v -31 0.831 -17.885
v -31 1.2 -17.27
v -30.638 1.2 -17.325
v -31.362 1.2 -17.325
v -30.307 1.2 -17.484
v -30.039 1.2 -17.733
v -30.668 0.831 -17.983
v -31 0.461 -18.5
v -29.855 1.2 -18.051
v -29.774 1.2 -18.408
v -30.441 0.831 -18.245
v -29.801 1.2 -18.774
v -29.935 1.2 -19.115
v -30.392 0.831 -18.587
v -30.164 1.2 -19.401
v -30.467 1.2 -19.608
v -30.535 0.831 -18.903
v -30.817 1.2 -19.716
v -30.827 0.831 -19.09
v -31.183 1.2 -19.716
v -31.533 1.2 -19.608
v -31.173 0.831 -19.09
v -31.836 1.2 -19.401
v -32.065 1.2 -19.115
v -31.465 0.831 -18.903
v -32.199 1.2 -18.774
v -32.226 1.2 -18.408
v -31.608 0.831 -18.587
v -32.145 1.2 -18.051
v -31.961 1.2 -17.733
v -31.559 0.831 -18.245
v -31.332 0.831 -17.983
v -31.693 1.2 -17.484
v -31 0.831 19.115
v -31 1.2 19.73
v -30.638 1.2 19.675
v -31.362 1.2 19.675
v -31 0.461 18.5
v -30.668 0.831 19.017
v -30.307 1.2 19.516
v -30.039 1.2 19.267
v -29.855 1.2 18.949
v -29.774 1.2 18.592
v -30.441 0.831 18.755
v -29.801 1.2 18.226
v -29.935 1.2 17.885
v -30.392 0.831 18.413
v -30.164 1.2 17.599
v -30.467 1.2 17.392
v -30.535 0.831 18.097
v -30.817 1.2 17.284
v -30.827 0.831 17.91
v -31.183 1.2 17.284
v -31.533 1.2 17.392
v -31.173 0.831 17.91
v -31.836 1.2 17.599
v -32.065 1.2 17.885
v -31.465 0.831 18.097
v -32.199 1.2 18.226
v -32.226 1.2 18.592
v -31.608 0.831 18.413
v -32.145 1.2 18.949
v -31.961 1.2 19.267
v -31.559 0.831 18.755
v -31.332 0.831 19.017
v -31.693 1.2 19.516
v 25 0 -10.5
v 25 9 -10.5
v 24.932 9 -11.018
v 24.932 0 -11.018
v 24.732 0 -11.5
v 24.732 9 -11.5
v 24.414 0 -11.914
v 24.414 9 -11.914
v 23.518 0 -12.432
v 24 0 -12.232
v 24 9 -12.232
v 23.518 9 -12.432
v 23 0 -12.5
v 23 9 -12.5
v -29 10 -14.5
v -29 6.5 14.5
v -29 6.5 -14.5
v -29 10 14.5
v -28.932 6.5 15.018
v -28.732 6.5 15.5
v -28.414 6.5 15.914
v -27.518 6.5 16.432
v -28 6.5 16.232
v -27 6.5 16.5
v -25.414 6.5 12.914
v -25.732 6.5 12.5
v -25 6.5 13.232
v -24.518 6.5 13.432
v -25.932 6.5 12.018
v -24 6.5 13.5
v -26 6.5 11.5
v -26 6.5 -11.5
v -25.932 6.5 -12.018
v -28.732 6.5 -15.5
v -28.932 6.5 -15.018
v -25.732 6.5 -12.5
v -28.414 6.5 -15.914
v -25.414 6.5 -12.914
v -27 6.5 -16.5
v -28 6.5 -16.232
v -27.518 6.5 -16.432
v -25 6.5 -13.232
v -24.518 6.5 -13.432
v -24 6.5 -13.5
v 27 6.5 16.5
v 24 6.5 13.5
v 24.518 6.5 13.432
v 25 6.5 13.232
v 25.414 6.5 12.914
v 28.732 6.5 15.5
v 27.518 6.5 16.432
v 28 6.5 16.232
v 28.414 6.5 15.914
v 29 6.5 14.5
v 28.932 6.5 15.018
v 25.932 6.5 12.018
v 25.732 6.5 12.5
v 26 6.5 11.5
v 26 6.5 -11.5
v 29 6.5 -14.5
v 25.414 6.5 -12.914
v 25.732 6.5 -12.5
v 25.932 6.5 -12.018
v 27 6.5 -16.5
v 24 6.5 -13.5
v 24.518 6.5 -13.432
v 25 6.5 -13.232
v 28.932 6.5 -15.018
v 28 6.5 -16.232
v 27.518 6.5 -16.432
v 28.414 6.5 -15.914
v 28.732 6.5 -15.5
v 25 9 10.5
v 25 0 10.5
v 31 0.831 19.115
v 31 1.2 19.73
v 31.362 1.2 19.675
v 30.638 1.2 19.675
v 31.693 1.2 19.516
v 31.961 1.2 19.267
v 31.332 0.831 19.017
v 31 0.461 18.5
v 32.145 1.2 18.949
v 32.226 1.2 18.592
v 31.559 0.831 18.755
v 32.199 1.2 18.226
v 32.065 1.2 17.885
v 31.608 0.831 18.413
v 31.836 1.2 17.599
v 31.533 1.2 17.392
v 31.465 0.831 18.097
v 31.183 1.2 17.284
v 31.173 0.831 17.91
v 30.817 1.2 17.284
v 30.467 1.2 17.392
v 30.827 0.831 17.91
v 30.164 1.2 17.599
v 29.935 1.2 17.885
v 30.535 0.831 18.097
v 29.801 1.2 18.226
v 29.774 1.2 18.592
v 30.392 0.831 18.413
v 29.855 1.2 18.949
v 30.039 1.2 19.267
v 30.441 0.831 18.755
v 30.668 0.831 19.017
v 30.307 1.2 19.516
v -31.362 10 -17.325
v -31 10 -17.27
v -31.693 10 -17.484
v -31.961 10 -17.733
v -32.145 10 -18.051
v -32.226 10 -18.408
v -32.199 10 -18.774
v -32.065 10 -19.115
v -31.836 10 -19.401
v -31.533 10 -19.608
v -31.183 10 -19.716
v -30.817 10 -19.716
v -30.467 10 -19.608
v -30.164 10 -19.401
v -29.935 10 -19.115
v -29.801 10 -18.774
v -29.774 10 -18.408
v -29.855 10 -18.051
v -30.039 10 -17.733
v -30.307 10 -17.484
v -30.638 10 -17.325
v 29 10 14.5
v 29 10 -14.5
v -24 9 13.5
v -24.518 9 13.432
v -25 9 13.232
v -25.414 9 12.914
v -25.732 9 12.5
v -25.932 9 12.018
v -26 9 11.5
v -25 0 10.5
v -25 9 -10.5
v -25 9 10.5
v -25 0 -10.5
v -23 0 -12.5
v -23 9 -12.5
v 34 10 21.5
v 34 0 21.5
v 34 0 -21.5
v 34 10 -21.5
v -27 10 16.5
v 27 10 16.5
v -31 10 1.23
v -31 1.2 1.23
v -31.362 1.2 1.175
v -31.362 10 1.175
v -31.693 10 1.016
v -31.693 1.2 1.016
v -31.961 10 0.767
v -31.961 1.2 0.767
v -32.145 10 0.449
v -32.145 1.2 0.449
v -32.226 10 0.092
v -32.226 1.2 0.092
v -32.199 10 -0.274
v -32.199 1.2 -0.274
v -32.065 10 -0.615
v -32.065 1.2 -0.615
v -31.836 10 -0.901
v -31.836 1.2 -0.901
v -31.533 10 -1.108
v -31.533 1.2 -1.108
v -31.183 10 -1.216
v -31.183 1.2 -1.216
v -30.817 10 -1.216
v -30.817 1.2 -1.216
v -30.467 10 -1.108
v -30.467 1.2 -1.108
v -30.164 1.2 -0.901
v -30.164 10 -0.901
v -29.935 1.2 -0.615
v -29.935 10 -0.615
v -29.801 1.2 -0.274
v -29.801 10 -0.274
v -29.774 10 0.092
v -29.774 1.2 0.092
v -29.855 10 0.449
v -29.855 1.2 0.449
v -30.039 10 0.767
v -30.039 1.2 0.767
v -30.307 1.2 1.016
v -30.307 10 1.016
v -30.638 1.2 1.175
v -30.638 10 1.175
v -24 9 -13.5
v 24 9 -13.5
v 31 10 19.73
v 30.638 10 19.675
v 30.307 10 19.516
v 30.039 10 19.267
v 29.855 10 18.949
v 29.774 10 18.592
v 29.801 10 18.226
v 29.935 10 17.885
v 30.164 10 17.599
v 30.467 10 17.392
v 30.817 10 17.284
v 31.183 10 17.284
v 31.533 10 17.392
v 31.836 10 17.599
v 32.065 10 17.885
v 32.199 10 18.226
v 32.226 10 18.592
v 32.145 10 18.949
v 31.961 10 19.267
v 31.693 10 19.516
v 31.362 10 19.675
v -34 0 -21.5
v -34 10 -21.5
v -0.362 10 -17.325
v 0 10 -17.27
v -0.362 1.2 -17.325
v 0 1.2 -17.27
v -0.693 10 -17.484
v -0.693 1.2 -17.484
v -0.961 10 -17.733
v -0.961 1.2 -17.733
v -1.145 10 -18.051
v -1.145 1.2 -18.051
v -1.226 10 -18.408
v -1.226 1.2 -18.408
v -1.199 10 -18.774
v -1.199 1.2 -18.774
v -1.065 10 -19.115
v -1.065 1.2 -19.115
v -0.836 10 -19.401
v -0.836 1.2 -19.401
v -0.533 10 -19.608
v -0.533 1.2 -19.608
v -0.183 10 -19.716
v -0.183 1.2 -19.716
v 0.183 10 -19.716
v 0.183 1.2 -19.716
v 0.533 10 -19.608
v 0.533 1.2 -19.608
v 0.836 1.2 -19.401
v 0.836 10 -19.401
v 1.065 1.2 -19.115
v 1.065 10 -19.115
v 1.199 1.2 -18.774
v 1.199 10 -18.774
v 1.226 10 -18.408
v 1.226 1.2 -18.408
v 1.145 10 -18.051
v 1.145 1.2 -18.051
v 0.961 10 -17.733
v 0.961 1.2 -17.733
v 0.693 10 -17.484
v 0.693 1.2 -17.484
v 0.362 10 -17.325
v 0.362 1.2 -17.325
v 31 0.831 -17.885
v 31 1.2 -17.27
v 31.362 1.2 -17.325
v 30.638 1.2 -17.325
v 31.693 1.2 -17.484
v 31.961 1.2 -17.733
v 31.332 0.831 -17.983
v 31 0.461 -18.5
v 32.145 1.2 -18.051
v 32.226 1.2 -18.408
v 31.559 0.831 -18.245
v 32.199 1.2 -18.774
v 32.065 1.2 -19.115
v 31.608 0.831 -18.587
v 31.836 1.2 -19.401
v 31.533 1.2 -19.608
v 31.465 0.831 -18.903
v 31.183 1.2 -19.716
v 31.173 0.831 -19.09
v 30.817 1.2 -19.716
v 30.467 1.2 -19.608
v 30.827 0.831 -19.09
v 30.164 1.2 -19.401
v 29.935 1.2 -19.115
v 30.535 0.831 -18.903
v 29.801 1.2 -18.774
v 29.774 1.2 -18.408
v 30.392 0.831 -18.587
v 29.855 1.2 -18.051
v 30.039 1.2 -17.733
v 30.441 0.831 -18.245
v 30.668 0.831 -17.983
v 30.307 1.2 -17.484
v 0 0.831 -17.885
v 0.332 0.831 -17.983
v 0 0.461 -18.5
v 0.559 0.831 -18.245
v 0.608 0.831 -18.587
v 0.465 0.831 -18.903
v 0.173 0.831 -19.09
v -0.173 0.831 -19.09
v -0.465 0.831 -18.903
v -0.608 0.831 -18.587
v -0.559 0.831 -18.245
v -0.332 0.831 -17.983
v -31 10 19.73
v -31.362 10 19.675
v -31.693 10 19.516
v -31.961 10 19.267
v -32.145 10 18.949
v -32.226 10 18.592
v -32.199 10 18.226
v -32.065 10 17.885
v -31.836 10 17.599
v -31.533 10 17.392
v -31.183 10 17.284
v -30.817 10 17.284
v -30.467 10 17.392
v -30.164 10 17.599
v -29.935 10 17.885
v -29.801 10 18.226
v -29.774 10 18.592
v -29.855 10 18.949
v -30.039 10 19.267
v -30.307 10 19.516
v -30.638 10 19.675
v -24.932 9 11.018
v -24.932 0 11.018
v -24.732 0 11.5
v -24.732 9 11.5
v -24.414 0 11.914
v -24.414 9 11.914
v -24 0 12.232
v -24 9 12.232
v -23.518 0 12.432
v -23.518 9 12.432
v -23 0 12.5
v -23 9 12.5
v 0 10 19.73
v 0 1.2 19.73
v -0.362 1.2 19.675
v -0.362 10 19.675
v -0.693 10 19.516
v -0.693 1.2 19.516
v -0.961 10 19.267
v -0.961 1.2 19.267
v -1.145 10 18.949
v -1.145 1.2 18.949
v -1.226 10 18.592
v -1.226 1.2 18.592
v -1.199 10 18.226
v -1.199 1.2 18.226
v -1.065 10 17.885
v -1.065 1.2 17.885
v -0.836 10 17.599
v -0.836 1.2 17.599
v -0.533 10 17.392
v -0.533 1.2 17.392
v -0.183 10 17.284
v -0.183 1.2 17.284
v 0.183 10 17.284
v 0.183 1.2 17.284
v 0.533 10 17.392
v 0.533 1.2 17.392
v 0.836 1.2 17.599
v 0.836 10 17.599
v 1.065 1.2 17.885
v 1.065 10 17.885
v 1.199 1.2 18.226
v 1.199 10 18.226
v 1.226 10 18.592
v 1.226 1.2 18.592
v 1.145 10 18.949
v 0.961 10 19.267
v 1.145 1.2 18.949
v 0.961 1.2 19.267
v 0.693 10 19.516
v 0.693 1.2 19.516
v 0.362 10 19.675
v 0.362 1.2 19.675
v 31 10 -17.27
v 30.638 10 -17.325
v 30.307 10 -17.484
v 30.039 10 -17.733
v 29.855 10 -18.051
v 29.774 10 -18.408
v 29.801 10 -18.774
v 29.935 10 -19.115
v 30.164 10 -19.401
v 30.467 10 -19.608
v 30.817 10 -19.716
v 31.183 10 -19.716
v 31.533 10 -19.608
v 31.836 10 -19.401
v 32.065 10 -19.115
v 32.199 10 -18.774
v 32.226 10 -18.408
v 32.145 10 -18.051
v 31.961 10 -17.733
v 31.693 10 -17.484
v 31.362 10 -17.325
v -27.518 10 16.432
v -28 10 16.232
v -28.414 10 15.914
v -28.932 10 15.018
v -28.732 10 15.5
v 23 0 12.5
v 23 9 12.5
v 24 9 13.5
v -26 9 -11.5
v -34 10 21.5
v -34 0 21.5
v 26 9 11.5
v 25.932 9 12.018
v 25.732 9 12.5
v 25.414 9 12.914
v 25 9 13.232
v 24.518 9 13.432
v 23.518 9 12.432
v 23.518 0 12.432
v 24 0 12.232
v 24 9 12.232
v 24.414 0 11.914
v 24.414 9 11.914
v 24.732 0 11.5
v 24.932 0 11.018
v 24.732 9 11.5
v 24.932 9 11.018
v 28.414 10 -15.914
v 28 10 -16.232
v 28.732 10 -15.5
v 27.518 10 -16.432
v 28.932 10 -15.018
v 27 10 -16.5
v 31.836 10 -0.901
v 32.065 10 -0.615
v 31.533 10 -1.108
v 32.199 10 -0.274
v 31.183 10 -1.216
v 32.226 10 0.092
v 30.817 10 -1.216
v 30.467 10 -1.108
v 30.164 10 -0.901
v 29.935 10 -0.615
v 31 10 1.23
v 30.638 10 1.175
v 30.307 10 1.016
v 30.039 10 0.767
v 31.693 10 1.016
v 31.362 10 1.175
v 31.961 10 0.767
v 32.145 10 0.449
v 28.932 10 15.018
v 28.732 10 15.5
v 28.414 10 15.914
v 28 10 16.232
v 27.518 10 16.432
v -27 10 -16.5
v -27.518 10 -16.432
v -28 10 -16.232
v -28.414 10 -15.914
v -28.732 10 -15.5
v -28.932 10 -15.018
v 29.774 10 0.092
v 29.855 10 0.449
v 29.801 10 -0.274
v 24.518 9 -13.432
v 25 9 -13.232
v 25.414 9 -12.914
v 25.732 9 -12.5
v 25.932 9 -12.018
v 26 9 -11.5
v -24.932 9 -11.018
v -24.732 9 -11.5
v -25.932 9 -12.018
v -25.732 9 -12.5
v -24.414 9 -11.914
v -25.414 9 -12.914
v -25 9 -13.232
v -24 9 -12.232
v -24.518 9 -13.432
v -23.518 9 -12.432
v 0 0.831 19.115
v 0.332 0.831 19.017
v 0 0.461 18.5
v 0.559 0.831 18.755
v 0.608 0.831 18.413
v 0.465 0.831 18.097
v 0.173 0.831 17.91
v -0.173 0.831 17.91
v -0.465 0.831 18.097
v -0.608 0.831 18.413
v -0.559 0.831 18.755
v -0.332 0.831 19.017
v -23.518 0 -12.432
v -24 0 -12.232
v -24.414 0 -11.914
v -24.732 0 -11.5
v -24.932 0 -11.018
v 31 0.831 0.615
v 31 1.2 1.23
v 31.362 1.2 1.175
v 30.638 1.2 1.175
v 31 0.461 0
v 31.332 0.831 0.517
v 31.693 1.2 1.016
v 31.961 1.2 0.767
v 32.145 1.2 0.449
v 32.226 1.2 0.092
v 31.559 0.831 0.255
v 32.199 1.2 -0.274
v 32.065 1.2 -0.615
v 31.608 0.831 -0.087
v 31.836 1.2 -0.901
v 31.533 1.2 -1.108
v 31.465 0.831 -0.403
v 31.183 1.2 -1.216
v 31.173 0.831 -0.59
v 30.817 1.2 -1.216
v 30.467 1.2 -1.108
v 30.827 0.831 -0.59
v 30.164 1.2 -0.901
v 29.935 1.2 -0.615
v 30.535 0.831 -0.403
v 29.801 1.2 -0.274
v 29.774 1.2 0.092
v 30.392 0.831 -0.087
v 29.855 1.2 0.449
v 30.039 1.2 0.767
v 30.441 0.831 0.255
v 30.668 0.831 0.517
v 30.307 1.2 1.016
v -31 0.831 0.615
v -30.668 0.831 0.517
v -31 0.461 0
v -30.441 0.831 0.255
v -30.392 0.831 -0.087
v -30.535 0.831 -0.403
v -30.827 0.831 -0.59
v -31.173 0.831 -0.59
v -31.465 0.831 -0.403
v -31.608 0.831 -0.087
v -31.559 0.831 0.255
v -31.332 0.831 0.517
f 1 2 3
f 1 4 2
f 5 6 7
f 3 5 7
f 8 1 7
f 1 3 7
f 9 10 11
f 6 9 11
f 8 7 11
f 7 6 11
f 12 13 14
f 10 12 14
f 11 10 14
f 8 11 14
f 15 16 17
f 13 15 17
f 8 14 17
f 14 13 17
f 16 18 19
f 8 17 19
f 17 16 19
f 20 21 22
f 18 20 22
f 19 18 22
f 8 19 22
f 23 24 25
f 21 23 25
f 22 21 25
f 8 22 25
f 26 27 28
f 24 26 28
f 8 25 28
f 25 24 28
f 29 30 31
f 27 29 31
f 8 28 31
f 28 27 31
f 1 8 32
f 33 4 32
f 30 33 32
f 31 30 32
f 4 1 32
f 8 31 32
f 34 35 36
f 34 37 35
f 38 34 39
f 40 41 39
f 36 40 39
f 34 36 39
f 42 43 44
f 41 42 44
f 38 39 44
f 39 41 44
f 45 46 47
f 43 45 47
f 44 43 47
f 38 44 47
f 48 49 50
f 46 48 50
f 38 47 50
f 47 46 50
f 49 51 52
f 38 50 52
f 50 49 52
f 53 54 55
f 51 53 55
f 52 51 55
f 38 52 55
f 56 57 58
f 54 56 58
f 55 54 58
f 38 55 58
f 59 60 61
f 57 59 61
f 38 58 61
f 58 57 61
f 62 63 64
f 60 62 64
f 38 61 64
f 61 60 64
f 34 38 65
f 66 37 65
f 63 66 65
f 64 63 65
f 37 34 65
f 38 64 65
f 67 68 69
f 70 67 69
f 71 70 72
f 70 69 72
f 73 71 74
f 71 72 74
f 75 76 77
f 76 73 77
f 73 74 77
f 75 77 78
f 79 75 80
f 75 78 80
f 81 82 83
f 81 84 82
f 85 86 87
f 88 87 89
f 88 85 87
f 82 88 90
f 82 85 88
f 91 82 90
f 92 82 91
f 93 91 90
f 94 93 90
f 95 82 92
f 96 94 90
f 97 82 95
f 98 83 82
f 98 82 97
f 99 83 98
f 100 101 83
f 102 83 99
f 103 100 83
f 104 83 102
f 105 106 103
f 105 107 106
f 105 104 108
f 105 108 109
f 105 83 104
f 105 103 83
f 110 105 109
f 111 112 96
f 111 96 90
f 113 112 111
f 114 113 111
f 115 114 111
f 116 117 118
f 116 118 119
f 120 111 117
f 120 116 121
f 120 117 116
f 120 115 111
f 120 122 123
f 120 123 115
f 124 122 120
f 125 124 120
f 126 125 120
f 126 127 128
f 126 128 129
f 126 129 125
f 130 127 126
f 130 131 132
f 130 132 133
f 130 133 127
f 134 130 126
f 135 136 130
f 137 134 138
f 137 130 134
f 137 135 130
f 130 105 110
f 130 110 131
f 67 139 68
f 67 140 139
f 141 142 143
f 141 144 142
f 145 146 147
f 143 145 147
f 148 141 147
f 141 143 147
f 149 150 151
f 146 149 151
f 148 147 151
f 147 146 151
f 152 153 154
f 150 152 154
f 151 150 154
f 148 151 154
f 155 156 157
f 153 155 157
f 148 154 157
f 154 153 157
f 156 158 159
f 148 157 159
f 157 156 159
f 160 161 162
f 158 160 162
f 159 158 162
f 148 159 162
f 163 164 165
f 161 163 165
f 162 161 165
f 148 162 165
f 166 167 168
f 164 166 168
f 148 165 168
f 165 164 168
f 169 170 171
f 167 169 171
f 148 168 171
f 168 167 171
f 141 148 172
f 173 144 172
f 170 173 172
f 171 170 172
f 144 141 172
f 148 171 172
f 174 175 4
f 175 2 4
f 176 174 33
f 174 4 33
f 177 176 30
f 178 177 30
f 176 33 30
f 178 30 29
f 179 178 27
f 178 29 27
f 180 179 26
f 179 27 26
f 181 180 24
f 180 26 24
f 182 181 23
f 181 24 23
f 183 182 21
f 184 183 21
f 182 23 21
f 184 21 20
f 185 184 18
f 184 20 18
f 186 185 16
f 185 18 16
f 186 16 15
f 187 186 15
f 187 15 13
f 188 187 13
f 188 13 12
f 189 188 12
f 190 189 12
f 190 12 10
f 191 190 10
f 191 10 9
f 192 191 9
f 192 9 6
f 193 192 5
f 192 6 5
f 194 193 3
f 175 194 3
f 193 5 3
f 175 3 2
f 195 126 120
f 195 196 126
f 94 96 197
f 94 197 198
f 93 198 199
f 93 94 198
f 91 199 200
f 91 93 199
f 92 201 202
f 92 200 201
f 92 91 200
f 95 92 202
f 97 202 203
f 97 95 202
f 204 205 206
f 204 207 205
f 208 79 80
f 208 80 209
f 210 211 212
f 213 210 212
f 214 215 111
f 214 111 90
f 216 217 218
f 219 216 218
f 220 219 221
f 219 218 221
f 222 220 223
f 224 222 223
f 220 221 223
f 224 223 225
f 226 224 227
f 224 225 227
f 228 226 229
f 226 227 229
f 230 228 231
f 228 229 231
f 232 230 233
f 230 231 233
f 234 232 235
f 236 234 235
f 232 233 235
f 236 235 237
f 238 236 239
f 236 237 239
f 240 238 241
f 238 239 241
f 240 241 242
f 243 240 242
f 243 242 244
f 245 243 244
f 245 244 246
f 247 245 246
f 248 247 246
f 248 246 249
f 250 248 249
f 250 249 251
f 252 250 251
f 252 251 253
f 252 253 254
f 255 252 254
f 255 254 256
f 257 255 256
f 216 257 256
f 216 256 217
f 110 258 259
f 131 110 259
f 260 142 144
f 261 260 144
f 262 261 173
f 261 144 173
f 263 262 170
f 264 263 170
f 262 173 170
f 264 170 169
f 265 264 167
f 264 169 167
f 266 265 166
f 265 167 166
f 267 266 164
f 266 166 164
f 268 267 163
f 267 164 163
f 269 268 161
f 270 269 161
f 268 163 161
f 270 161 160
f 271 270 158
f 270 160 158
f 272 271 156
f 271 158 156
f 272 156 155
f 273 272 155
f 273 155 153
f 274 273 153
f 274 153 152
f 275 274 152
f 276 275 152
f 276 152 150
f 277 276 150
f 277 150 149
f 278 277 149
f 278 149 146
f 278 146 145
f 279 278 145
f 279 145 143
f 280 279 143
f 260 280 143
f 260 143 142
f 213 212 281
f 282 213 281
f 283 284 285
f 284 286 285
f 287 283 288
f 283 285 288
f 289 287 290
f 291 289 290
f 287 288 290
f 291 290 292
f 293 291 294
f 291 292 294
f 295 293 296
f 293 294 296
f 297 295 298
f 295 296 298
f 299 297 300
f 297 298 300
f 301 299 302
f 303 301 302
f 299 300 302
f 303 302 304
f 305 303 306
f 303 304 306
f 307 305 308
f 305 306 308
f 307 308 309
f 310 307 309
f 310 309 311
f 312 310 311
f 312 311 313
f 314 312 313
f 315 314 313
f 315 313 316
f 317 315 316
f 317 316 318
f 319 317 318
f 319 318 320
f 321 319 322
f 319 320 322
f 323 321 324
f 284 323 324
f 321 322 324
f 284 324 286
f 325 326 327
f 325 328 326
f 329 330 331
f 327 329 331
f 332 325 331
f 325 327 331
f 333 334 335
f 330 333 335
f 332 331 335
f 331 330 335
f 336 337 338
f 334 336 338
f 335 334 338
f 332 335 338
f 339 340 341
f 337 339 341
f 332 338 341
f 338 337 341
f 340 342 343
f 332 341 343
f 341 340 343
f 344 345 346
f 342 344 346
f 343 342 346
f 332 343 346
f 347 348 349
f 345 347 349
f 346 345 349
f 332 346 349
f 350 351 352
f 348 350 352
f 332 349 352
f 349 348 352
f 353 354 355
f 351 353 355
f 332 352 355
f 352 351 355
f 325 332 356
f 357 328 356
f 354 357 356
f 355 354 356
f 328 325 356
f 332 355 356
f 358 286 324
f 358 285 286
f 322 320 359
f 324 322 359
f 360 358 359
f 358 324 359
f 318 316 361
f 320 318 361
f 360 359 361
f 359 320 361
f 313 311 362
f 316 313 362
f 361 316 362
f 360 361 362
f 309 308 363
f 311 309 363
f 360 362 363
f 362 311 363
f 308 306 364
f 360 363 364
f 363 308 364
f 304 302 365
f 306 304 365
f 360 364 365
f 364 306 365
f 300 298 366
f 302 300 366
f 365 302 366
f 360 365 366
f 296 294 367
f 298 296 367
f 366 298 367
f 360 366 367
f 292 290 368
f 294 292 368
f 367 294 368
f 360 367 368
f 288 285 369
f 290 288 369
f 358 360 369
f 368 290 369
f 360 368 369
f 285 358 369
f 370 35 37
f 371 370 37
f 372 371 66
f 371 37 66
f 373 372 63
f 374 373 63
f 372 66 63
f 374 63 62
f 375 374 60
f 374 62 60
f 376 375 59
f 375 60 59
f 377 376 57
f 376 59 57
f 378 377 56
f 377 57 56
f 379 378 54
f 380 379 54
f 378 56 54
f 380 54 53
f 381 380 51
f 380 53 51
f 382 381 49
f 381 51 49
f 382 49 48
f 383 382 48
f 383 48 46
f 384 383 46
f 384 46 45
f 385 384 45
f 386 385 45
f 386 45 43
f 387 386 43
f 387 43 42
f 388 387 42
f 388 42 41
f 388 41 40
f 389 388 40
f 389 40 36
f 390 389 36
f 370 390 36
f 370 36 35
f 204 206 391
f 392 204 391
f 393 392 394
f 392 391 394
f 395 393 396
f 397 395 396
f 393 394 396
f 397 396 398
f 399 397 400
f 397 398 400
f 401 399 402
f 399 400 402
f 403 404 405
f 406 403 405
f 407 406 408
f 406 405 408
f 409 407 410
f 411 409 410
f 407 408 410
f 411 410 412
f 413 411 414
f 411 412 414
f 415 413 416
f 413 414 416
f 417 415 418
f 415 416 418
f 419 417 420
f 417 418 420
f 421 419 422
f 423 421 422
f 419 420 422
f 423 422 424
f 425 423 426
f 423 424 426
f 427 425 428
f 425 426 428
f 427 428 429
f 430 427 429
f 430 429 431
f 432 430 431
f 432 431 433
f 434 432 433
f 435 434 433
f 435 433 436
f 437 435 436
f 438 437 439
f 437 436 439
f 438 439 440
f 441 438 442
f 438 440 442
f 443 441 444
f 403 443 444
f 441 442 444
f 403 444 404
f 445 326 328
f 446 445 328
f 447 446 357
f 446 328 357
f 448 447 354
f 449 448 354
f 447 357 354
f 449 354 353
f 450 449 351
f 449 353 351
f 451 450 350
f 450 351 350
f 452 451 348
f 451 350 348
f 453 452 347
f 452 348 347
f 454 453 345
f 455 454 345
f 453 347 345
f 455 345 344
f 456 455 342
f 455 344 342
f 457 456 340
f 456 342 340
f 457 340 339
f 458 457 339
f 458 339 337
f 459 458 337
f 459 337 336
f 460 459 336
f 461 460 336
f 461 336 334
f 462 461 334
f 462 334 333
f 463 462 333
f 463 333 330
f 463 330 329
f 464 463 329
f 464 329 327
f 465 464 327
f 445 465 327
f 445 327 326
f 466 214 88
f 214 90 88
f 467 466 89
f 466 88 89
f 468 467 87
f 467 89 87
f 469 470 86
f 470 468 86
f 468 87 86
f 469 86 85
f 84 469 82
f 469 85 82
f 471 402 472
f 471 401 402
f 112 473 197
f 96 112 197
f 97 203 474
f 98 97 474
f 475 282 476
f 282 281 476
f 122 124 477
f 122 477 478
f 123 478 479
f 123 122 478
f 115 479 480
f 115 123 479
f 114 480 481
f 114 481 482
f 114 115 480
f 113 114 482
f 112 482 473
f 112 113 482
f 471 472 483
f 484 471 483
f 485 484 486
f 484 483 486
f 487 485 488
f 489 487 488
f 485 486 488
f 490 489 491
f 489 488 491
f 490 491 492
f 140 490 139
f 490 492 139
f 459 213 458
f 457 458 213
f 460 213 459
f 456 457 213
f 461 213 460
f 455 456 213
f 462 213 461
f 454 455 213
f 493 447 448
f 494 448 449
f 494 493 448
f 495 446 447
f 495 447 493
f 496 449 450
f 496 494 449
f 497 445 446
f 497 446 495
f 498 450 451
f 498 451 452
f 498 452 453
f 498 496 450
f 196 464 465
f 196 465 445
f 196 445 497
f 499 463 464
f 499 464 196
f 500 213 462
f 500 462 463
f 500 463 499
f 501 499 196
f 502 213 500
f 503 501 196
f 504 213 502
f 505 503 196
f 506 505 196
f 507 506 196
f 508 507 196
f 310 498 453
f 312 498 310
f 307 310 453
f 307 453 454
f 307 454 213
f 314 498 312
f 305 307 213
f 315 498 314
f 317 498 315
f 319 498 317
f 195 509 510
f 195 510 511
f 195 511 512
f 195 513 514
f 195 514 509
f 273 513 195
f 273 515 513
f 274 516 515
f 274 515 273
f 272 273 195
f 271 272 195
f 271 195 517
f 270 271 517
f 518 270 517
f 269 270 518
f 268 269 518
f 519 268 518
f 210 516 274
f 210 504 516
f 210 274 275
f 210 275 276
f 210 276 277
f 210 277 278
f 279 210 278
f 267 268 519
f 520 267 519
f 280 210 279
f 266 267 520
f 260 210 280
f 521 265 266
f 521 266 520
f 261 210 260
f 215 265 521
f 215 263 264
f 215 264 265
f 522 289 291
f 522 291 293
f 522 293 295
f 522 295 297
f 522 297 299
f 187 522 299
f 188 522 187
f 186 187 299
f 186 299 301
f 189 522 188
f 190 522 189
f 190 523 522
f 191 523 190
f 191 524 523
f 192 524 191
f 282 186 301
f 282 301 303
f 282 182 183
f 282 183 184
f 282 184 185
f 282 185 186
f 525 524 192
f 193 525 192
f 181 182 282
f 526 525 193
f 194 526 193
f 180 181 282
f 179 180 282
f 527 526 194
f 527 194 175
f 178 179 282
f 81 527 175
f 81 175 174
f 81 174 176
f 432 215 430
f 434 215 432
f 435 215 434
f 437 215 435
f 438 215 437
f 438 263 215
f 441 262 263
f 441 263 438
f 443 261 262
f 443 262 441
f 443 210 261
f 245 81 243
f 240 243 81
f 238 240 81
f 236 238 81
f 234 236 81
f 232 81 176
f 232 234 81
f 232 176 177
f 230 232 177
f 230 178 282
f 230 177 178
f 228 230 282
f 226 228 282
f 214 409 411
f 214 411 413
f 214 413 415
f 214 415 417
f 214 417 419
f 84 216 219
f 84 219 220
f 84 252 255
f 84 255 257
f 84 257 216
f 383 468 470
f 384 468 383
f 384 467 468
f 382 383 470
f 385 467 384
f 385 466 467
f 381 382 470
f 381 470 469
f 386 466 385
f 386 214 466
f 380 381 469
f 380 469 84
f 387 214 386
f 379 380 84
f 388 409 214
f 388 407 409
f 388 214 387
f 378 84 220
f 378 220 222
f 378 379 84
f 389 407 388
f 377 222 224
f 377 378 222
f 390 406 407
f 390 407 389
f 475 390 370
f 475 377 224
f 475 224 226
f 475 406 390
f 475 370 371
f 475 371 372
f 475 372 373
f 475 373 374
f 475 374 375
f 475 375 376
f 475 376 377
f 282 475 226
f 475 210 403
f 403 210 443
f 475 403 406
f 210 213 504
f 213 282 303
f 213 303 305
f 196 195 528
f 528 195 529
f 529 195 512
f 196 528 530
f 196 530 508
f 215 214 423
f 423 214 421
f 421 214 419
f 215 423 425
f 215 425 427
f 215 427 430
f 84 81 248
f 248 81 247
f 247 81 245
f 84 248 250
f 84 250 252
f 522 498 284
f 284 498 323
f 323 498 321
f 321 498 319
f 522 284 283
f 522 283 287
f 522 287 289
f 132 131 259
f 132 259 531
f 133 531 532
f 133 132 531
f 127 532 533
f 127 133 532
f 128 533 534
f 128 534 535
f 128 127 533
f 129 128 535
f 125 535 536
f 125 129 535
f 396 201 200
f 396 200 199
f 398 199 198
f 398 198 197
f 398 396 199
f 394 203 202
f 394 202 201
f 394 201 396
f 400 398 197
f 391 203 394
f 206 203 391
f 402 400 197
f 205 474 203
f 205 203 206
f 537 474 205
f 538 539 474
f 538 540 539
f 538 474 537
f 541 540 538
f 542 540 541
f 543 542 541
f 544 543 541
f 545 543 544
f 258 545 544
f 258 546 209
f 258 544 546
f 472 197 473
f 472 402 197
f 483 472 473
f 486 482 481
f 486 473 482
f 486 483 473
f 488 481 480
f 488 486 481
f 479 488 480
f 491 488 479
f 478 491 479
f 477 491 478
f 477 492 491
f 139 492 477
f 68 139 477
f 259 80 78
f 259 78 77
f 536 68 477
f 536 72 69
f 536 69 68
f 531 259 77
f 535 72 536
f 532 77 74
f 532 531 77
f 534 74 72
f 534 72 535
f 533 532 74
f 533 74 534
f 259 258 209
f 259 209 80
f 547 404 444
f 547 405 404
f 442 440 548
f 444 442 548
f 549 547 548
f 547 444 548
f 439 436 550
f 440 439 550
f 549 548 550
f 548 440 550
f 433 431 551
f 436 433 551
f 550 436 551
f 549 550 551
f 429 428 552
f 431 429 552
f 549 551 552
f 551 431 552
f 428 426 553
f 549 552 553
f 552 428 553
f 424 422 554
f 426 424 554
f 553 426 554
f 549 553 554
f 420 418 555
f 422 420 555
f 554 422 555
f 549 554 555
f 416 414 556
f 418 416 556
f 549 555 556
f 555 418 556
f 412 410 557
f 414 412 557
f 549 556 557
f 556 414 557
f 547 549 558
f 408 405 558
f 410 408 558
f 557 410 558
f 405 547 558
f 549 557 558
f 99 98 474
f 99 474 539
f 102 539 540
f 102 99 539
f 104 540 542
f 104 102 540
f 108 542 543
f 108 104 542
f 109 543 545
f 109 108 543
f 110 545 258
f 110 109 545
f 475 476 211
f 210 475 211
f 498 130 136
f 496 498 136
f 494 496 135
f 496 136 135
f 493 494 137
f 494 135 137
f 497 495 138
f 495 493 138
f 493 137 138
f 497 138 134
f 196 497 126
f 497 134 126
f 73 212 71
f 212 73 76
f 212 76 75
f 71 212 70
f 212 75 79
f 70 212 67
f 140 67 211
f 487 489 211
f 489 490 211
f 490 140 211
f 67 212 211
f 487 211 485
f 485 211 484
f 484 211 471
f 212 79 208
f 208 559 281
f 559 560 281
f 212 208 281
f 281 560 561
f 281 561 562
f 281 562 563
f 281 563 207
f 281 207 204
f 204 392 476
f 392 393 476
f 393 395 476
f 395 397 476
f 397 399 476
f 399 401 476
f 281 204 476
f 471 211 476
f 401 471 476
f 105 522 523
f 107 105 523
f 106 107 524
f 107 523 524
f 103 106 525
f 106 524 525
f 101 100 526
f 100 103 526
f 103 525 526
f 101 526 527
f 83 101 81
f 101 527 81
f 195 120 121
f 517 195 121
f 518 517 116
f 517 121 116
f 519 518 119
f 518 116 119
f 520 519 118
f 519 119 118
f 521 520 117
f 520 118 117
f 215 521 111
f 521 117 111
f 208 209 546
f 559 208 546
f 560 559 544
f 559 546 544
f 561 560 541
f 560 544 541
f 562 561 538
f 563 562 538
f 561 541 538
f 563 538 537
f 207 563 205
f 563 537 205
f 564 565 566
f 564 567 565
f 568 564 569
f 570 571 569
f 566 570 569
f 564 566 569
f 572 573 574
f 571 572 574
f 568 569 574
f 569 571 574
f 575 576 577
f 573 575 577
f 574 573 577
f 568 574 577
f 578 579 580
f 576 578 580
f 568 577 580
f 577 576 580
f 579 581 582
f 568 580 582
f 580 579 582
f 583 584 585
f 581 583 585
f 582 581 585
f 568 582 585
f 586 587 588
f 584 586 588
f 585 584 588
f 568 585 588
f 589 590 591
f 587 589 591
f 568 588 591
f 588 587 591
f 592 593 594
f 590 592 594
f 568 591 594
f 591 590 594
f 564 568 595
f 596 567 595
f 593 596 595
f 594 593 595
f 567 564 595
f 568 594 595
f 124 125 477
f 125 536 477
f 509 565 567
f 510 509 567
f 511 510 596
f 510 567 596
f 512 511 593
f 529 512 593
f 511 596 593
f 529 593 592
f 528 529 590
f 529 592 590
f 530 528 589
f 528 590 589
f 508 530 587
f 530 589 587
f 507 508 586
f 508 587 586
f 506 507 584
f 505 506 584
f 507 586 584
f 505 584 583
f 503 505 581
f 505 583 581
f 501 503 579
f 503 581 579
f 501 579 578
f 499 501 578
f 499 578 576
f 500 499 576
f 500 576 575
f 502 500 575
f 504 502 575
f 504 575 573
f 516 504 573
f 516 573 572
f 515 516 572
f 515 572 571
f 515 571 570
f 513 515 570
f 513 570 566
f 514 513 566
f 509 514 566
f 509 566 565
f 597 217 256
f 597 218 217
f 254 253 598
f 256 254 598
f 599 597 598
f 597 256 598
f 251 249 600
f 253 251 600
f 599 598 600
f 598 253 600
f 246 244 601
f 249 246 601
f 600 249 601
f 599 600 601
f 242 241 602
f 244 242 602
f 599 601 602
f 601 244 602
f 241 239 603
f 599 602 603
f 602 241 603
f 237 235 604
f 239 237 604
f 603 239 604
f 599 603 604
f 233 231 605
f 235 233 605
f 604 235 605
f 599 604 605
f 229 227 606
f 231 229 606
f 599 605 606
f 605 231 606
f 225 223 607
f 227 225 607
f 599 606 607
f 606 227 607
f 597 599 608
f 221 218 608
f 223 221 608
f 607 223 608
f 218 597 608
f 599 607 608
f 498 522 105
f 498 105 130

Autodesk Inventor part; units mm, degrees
ref_plane "YZ Plane" through (0, 0, 0) normal (1, 0, 0) x (0, 1, 0)
ref_plane "XZ Plane" through (0, 0, 0) normal (0, 1, 0) x (-1, 0, 0)
ref_plane "XY Plane" through (0, 0, 0) normal (0, 0, 1) x (1, 0, 0)
sketch "Sketch2" plane through (0, 0, 0) normal (0, 1, 0) x (-1, 0, 0)
  line L0 (-25, -12.5) -> (25, -12.5)
  line L1 (25, -12.5) -> (25, 12.5)
  line L2 (25, 12.5) -> (-25, 12.5)
  line L3 (-25, 12.5) -> (-25, -12.5)
  line L4 (-25, -12.5) -> (25, 12.5) construction
  line L5 (25, -12.5) -> (-25, 12.5) construction
  line L6 (-34, -21.5) -> (34, -21.5)
  line L7 (34, -21.5) -> (34, 21.5)
  line L8 (34, 21.5) -> (-34, 21.5)
  line L9 (-34, 21.5) -> (-34, -21.5)
  line L10 (-34, -21.5) -> (34, 21.5) construction
  line L11 (34, -21.5) -> (-34, 21.5) construction
  point P0 (0, 0)
  dimension "d0" = 50
  dimension "d1" = 25
  dimension "d4" = 9
  dimension "d5" = 9
  dimension "d53" = 68
  dimension "d54" = 43
extrude "Extrusion1" add sketch "Sketch2" along normal blind 10
sketch "Sketch4" plane through (0, 10, 0) normal (0, 1, 0) x (1, 0, 0)
  line L0 (-34, 21.5) -> (-34, -21.5) construction
  line L1 (-34, -21.5) -> (34, -21.5) construction
  line L2 (34, -21.5) -> (34, 21.5) construction
  line L3 (34, 21.5) -> (-34, 21.5) construction
  line L4 (25, 12.5) -> (25, -12.5) construction
  line L5 (25, -12.5) -> (-25, -12.5) construction
  line L6 (-25, -12.5) -> (-25, 12.5) construction
  line L7 (-25, 12.5) -> (25, 12.5) construction
  line L8 (-25, 12.5) -> (25, 12.5)
  line L9 (25, 12.5) -> (25, -12.5)
  line L10 (25, -12.5) -> (-25, -12.5)
  line L11 (-25, -12.5) -> (-25, 12.5)
  line L12 (-25, 12.5) -> (25, -12.5) construction
  line L13 (25, 12.5) -> (-25, -12.5) construction
  line L14 (-29, 16.5) -> (29, 16.5)
  line L15 (29, 16.5) -> (29, -16.5)
  line L16 (29, -16.5) -> (-29, -16.5)
  line L17 (-29, -16.5) -> (-29, 16.5)
  line L18 (-29, 16.5) -> (29, -16.5) construction
  line L19 (29, 16.5) -> (-29, -16.5) construction
  point P0 (0, 0)
  dimension "d8" = 4
  dimension "d9" = 4
extrude "Extrusion2" cut sketch "Sketch4" against normal blind 1
sketch "Sketch7" plane through (0, 9, 0) normal (0, 1, 0) x (1, 0, 0)
  line L0 (29, -16.5) -> (-29, -16.5) construction
  line L1 (29, 16.5) -> (29, -16.5) construction
  line L2 (-29, 16.5) -> (29, 16.5) construction
  line L3 (-29, -16.5) -> (-29, 16.5) construction
  line L4 (25, 12.5) -> (-25, 12.5) construction
  line L5 (25, -12.5) -> (25, 12.5) construction
  line L6 (-25, -12.5) -> (25, -12.5) construction
  line L7 (-25, 12.5) -> (-25, -12.5) construction
  line L8 (-26, 13.5) -> (26, 13.5)
  line L9 (26, 13.5) -> (26, -13.5)
  line L10 (26, -13.5) -> (-26, -13.5)
  line L11 (-26, -13.5) -> (-26, 13.5)
  line L12 (-26, 13.5) -> (26, -13.5) construction
  line L13 (26, 13.5) -> (-26, -13.5) construction
  line L14 (-29, 16.5) -> (29, 16.5)
  line L15 (29, 16.5) -> (29, -16.5)
  line L16 (29, -16.5) -> (-29, -16.5)
  line L17 (-29, -16.5) -> (-29, 16.5)
  line L18 (-29, 16.5) -> (29, -16.5) construction
  line L19 (29, 16.5) -> (-29, -16.5) construction
  point P0 (0, 0)
  dimension "d15" = 3
  dimension "d16" = 3
extrude "Extrusion3" cut sketch "Sketch7" against normal blind 2.5
fillet "Fillet1" radius 2 8 edges at (26, 7.75, 13.5) (-26, 7.75, 13.5) (-26, 7.75, -13.5) (26, 7.75, -13.5) (25, 4.5, 12.5) (25, 4.5, -12.5) (-25, 4.5, -12.5) (-25, 4.5, 12.5)
fillet "Fillet2" radius 2 4 edges at (29, 8.25, 16.5) (29, 8.25, -16.5) (-29, 8.25, 16.5) (-29, 8.25, -16.5)
sketch "Sketch8" plane through (0, 10, 0) normal (0, 1, 0) x (1, 0, 0)
  line L0 (29, 14.5) -> (29, -14.5) construction
  arc A0 (27, -16.5) -> (29, -14.5) centre (27, -14.5) ccw construction
  line L1 (27, -16.5) -> (-27, -16.5) construction
  arc A1 (-29, -14.5) -> (-27, -16.5) centre (-27, -14.5) ccw construction
  line L2 (-29, -14.5) -> (-29, 14.5) construction
  arc A2 (-27, 16.5) -> (-29, 14.5) centre (-27, 14.5) ccw construction
  line L3 (-27, 16.5) -> (27, 16.5) construction
  arc A3 (29, 14.5) -> (27, 16.5) centre (27, 14.5) ccw construction
  line L4 (-34, 21.5) -> (-34, -21.5) construction
  line L5 (-34, -21.5) -> (34, -21.5) construction
  line L6 (34, -21.5) -> (34, 21.5) construction
  line L7 (34, 21.5) -> (-34, 21.5) construction
  line L8 (49, 0) -> (-49, 0) construction
  line L9 (0, 31.5) -> (0, -31.5) construction
  line L10 (-25, 10.5) -> (-25, -10.5) construction
  line L11 (23, 12.5) -> (-23, 12.5) construction
  line L12 (25, -10.5) -> (25, 10.5) construction
  line L13 (-23, -12.5) -> (23, -12.5) construction
  point P0 (0, 0)
  point P1 (31, -18.5)
  point P2 (31, 0)
  point P3 (31, 18.5)
  point P4 (0, 18.5)
  point P5 (-31, 18.5)
  point P6 (-31, 0)
  point P7 (-31, -18.5)
  point P8 (0, -18.5)
  dimension "d21" = 5
  dimension "d41" = 6
  dimension "d42" = 6
  dimension "d43" = 6
  dimension "d44" = 6
  dimension "d45" = 6
  dimension "d46" = 6
  dimension "d47" = 6
  dimension "d48" = 6
  dimension "d49" = 6
  dimension "d50" = 6
  dimension "d51" = 6
  dimension "d52" = 6
hole "Hole1" at (31, 10, 18.5) at (31, 10, 0) at (31, 10, -18.5) at (0, 10, -18.5) at (-31, 10, -18.5) at (-31, 10, 0) at (-31, 10, 18.5) at (0, 10, 18.5) direction (0, -1, 0) diameter 2.459 depth 8.8 tip angle 118 thread size "M3x0.5" class "6H" standard "ISO Metric profile"
properties part number "P018_BasEcranProtecLidar"
